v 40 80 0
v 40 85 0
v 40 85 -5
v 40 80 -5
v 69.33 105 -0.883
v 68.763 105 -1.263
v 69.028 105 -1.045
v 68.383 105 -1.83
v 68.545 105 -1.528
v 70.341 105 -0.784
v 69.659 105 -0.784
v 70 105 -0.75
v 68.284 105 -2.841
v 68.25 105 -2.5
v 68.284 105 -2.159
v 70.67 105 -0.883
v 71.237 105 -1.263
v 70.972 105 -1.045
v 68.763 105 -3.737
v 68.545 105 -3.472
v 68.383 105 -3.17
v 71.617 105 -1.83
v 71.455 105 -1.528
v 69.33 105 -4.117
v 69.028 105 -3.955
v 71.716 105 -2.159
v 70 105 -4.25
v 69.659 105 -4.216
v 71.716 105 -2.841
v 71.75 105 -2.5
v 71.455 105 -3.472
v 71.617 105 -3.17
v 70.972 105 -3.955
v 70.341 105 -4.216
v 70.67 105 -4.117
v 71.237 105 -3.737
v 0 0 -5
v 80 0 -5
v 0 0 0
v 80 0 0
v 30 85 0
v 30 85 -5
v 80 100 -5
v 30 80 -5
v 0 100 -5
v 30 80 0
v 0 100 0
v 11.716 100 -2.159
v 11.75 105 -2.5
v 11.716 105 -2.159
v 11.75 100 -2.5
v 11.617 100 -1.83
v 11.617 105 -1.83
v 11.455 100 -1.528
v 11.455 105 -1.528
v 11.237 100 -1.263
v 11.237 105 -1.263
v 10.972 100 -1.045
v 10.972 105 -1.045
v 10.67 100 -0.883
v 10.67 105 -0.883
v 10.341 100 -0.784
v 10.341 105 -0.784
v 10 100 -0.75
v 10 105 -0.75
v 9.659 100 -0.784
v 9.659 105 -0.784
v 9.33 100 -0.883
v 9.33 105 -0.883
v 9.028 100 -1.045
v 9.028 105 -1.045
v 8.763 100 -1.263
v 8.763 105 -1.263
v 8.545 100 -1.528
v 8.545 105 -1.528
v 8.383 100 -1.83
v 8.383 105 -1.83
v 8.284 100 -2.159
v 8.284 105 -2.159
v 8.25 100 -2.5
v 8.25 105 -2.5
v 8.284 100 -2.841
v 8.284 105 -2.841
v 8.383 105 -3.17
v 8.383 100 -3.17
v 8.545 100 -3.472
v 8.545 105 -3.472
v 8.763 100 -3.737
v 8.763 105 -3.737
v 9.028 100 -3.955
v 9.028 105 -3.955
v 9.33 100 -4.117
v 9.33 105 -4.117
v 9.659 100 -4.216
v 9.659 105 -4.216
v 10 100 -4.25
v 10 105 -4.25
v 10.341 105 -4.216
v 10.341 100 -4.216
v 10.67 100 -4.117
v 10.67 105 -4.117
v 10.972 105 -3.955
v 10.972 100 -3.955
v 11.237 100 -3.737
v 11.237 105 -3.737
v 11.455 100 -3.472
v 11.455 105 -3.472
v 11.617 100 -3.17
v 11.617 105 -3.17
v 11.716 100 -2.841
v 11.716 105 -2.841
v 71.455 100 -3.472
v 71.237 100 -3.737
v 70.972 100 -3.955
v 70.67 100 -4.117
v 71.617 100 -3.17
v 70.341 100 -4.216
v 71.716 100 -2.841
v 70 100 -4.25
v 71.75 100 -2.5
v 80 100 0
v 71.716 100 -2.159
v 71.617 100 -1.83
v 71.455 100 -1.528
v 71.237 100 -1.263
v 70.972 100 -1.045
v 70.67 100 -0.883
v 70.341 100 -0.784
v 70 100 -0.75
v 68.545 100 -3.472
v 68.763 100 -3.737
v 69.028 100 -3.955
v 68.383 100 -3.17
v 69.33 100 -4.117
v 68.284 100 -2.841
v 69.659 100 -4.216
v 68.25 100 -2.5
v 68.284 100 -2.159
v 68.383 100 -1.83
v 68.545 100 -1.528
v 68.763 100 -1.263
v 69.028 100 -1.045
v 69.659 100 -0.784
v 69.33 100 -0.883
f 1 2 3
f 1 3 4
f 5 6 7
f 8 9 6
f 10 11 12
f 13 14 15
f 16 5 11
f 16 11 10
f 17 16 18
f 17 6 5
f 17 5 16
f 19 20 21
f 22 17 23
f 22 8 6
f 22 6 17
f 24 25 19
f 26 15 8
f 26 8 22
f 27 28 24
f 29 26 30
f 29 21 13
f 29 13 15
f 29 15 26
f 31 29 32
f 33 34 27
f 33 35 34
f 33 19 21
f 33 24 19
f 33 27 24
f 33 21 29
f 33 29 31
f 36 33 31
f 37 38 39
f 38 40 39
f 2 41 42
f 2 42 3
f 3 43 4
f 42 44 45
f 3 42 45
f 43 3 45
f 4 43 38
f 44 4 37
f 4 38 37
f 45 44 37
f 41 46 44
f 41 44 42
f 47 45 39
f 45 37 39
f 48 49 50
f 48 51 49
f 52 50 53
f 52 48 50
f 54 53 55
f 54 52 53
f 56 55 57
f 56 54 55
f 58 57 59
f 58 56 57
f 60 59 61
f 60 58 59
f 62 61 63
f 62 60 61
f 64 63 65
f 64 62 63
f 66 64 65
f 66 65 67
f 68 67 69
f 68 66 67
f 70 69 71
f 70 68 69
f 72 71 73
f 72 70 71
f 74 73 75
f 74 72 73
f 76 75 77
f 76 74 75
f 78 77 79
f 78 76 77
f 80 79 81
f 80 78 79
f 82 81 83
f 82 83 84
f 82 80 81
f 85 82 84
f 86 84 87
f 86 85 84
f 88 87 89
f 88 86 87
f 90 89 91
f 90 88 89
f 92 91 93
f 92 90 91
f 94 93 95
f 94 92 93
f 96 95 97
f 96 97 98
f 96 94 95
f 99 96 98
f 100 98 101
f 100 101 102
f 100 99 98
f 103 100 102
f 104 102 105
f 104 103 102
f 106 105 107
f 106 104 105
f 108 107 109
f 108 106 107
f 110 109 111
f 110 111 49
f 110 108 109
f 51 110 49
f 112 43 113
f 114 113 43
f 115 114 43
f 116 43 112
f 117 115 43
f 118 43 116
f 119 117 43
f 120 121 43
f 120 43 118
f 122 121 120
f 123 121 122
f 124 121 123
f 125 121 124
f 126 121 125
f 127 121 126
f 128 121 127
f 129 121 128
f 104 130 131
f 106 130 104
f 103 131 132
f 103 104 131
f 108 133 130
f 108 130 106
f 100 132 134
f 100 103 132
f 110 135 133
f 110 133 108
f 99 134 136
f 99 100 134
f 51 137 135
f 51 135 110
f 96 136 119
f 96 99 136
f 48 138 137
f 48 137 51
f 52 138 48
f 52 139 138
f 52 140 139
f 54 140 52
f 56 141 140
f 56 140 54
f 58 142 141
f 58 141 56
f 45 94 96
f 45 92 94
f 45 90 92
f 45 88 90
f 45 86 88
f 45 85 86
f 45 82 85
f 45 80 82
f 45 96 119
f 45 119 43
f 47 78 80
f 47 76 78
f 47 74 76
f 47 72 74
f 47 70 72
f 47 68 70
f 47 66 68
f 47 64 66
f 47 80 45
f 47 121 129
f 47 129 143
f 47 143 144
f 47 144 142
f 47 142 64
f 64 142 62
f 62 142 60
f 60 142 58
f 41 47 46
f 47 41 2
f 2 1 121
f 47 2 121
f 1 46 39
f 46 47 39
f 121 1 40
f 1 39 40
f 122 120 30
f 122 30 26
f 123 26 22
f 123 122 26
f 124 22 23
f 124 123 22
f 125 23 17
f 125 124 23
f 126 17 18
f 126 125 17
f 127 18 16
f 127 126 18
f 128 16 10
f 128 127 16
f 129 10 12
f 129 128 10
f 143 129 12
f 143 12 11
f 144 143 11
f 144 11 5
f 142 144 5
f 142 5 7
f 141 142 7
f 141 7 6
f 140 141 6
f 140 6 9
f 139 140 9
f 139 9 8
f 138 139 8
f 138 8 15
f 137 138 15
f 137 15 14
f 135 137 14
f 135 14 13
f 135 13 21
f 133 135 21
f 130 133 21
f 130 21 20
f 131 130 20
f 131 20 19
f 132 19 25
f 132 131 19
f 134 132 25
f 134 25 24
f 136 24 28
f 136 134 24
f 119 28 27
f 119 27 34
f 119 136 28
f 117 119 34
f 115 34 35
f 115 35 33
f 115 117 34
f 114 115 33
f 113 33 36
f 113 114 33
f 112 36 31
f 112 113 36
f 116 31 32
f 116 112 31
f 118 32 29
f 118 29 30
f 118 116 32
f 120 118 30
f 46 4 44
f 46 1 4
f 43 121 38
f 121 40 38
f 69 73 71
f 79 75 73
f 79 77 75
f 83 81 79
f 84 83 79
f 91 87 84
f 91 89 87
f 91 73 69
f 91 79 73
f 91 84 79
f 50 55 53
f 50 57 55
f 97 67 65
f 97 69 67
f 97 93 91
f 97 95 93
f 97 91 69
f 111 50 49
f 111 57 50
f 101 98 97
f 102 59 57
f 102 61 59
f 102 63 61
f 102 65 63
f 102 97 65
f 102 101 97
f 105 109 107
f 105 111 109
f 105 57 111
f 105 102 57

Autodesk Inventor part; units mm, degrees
ref_plane "YZ Plane" through (0, 0, 0) normal (1, 0, 0) x (0, 1, 0)
ref_plane "XZ Plane" through (0, 0, 0) normal (0, 1, 0) x (-1, 0, 0)
ref_plane "XY Plane" through (0, 0, 0) normal (0, 0, 1) x (1, 0, 0)
sketch "Sketch1" plane through (0, 0, 0) normal (0, 1, 0) x (-1, 0, 0)
  line L0 (0, 0) -> (-80, 0)
  line L1 (-80, 0) -> (-80, -5)
  line L2 (-80, -5) -> (0, -5)
  line L3 (0, -5) -> (0, 0)
  dimension "d0" = 80
  dimension "d1" = 5
extrude "Extrusion1" add sketch "Sketch1" along normal blind 100
sketch "Sketch2" plane through (0, 100, 0) normal (0, 1, 0) x (1, 0, 0)
  line L0 (0, 0) -> (10, 0)
  line L1 (10, 0) -> (10, 2.5)
  line L2 (10, 2.5) -> (0, 2.5)
  line L3 (0, 2.5) -> (0, 0)
  circle A0 centre (10, 2.5) radius 1.75
  dimension "d4" = 10
  dimension "d5" = 2.5
  dimension "d6" = 3.5
extrude "Extrusion2" add sketch "Sketch2" along normal blind 5 contours A0 L2 L1 | L1 L2 A0
sketch "Sketch3" plane through (0, 100, 0) normal (0, 1, 0) x (1, 0, 0)
  line L0 (80, 5) -> (0, 5) projected
  line L1 (80, 5) -> (70, 5)
  line L2 (70, 5) -> (70, 2.5)
  line L3 (70, 2.5) -> (80, 2.5)
  line L4 (80, 2.5) -> (80, 5)
  circle A0 centre (70, 2.5) radius 1.75
  point P0 (0, 0)
  dimension "d9" = 10
  dimension "d10" = 2.5
  dimension "d11" = 3.5
extrude "Extrusion3" add sketch "Sketch3" along normal blind 5 contours A0 L3 L2 | L2 L3 A0
sketch "Sketch4" plane through (0, 0, 0) normal (0, 0, 1) x (1, 0, 0)
  line L0 (0, 0) -> (80, 0) projected
  line L1 (80, 0) -> (40, 0)
  line L2 (40, 0) -> (40, 80)
  line L3 (40, 80) -> (80, 80)
  line L4 (80, 80) -> (80, 0)
  line L5 (40, 80) -> (30, 80)
  line L6 (30, 80) -> (30, 85)
  line L7 (30, 85) -> (40, 85)
  line L8 (40, 85) -> (40, 80)
  dimension "d14" = 40
  dimension "d15" = 80
  dimension "d16" = 10
  dimension "d17" = 5
extrude "Extrusion4" cut sketch "Sketch4" against normal blind 10 contours L5 L6 L7 L8
properties part number "expo4"
